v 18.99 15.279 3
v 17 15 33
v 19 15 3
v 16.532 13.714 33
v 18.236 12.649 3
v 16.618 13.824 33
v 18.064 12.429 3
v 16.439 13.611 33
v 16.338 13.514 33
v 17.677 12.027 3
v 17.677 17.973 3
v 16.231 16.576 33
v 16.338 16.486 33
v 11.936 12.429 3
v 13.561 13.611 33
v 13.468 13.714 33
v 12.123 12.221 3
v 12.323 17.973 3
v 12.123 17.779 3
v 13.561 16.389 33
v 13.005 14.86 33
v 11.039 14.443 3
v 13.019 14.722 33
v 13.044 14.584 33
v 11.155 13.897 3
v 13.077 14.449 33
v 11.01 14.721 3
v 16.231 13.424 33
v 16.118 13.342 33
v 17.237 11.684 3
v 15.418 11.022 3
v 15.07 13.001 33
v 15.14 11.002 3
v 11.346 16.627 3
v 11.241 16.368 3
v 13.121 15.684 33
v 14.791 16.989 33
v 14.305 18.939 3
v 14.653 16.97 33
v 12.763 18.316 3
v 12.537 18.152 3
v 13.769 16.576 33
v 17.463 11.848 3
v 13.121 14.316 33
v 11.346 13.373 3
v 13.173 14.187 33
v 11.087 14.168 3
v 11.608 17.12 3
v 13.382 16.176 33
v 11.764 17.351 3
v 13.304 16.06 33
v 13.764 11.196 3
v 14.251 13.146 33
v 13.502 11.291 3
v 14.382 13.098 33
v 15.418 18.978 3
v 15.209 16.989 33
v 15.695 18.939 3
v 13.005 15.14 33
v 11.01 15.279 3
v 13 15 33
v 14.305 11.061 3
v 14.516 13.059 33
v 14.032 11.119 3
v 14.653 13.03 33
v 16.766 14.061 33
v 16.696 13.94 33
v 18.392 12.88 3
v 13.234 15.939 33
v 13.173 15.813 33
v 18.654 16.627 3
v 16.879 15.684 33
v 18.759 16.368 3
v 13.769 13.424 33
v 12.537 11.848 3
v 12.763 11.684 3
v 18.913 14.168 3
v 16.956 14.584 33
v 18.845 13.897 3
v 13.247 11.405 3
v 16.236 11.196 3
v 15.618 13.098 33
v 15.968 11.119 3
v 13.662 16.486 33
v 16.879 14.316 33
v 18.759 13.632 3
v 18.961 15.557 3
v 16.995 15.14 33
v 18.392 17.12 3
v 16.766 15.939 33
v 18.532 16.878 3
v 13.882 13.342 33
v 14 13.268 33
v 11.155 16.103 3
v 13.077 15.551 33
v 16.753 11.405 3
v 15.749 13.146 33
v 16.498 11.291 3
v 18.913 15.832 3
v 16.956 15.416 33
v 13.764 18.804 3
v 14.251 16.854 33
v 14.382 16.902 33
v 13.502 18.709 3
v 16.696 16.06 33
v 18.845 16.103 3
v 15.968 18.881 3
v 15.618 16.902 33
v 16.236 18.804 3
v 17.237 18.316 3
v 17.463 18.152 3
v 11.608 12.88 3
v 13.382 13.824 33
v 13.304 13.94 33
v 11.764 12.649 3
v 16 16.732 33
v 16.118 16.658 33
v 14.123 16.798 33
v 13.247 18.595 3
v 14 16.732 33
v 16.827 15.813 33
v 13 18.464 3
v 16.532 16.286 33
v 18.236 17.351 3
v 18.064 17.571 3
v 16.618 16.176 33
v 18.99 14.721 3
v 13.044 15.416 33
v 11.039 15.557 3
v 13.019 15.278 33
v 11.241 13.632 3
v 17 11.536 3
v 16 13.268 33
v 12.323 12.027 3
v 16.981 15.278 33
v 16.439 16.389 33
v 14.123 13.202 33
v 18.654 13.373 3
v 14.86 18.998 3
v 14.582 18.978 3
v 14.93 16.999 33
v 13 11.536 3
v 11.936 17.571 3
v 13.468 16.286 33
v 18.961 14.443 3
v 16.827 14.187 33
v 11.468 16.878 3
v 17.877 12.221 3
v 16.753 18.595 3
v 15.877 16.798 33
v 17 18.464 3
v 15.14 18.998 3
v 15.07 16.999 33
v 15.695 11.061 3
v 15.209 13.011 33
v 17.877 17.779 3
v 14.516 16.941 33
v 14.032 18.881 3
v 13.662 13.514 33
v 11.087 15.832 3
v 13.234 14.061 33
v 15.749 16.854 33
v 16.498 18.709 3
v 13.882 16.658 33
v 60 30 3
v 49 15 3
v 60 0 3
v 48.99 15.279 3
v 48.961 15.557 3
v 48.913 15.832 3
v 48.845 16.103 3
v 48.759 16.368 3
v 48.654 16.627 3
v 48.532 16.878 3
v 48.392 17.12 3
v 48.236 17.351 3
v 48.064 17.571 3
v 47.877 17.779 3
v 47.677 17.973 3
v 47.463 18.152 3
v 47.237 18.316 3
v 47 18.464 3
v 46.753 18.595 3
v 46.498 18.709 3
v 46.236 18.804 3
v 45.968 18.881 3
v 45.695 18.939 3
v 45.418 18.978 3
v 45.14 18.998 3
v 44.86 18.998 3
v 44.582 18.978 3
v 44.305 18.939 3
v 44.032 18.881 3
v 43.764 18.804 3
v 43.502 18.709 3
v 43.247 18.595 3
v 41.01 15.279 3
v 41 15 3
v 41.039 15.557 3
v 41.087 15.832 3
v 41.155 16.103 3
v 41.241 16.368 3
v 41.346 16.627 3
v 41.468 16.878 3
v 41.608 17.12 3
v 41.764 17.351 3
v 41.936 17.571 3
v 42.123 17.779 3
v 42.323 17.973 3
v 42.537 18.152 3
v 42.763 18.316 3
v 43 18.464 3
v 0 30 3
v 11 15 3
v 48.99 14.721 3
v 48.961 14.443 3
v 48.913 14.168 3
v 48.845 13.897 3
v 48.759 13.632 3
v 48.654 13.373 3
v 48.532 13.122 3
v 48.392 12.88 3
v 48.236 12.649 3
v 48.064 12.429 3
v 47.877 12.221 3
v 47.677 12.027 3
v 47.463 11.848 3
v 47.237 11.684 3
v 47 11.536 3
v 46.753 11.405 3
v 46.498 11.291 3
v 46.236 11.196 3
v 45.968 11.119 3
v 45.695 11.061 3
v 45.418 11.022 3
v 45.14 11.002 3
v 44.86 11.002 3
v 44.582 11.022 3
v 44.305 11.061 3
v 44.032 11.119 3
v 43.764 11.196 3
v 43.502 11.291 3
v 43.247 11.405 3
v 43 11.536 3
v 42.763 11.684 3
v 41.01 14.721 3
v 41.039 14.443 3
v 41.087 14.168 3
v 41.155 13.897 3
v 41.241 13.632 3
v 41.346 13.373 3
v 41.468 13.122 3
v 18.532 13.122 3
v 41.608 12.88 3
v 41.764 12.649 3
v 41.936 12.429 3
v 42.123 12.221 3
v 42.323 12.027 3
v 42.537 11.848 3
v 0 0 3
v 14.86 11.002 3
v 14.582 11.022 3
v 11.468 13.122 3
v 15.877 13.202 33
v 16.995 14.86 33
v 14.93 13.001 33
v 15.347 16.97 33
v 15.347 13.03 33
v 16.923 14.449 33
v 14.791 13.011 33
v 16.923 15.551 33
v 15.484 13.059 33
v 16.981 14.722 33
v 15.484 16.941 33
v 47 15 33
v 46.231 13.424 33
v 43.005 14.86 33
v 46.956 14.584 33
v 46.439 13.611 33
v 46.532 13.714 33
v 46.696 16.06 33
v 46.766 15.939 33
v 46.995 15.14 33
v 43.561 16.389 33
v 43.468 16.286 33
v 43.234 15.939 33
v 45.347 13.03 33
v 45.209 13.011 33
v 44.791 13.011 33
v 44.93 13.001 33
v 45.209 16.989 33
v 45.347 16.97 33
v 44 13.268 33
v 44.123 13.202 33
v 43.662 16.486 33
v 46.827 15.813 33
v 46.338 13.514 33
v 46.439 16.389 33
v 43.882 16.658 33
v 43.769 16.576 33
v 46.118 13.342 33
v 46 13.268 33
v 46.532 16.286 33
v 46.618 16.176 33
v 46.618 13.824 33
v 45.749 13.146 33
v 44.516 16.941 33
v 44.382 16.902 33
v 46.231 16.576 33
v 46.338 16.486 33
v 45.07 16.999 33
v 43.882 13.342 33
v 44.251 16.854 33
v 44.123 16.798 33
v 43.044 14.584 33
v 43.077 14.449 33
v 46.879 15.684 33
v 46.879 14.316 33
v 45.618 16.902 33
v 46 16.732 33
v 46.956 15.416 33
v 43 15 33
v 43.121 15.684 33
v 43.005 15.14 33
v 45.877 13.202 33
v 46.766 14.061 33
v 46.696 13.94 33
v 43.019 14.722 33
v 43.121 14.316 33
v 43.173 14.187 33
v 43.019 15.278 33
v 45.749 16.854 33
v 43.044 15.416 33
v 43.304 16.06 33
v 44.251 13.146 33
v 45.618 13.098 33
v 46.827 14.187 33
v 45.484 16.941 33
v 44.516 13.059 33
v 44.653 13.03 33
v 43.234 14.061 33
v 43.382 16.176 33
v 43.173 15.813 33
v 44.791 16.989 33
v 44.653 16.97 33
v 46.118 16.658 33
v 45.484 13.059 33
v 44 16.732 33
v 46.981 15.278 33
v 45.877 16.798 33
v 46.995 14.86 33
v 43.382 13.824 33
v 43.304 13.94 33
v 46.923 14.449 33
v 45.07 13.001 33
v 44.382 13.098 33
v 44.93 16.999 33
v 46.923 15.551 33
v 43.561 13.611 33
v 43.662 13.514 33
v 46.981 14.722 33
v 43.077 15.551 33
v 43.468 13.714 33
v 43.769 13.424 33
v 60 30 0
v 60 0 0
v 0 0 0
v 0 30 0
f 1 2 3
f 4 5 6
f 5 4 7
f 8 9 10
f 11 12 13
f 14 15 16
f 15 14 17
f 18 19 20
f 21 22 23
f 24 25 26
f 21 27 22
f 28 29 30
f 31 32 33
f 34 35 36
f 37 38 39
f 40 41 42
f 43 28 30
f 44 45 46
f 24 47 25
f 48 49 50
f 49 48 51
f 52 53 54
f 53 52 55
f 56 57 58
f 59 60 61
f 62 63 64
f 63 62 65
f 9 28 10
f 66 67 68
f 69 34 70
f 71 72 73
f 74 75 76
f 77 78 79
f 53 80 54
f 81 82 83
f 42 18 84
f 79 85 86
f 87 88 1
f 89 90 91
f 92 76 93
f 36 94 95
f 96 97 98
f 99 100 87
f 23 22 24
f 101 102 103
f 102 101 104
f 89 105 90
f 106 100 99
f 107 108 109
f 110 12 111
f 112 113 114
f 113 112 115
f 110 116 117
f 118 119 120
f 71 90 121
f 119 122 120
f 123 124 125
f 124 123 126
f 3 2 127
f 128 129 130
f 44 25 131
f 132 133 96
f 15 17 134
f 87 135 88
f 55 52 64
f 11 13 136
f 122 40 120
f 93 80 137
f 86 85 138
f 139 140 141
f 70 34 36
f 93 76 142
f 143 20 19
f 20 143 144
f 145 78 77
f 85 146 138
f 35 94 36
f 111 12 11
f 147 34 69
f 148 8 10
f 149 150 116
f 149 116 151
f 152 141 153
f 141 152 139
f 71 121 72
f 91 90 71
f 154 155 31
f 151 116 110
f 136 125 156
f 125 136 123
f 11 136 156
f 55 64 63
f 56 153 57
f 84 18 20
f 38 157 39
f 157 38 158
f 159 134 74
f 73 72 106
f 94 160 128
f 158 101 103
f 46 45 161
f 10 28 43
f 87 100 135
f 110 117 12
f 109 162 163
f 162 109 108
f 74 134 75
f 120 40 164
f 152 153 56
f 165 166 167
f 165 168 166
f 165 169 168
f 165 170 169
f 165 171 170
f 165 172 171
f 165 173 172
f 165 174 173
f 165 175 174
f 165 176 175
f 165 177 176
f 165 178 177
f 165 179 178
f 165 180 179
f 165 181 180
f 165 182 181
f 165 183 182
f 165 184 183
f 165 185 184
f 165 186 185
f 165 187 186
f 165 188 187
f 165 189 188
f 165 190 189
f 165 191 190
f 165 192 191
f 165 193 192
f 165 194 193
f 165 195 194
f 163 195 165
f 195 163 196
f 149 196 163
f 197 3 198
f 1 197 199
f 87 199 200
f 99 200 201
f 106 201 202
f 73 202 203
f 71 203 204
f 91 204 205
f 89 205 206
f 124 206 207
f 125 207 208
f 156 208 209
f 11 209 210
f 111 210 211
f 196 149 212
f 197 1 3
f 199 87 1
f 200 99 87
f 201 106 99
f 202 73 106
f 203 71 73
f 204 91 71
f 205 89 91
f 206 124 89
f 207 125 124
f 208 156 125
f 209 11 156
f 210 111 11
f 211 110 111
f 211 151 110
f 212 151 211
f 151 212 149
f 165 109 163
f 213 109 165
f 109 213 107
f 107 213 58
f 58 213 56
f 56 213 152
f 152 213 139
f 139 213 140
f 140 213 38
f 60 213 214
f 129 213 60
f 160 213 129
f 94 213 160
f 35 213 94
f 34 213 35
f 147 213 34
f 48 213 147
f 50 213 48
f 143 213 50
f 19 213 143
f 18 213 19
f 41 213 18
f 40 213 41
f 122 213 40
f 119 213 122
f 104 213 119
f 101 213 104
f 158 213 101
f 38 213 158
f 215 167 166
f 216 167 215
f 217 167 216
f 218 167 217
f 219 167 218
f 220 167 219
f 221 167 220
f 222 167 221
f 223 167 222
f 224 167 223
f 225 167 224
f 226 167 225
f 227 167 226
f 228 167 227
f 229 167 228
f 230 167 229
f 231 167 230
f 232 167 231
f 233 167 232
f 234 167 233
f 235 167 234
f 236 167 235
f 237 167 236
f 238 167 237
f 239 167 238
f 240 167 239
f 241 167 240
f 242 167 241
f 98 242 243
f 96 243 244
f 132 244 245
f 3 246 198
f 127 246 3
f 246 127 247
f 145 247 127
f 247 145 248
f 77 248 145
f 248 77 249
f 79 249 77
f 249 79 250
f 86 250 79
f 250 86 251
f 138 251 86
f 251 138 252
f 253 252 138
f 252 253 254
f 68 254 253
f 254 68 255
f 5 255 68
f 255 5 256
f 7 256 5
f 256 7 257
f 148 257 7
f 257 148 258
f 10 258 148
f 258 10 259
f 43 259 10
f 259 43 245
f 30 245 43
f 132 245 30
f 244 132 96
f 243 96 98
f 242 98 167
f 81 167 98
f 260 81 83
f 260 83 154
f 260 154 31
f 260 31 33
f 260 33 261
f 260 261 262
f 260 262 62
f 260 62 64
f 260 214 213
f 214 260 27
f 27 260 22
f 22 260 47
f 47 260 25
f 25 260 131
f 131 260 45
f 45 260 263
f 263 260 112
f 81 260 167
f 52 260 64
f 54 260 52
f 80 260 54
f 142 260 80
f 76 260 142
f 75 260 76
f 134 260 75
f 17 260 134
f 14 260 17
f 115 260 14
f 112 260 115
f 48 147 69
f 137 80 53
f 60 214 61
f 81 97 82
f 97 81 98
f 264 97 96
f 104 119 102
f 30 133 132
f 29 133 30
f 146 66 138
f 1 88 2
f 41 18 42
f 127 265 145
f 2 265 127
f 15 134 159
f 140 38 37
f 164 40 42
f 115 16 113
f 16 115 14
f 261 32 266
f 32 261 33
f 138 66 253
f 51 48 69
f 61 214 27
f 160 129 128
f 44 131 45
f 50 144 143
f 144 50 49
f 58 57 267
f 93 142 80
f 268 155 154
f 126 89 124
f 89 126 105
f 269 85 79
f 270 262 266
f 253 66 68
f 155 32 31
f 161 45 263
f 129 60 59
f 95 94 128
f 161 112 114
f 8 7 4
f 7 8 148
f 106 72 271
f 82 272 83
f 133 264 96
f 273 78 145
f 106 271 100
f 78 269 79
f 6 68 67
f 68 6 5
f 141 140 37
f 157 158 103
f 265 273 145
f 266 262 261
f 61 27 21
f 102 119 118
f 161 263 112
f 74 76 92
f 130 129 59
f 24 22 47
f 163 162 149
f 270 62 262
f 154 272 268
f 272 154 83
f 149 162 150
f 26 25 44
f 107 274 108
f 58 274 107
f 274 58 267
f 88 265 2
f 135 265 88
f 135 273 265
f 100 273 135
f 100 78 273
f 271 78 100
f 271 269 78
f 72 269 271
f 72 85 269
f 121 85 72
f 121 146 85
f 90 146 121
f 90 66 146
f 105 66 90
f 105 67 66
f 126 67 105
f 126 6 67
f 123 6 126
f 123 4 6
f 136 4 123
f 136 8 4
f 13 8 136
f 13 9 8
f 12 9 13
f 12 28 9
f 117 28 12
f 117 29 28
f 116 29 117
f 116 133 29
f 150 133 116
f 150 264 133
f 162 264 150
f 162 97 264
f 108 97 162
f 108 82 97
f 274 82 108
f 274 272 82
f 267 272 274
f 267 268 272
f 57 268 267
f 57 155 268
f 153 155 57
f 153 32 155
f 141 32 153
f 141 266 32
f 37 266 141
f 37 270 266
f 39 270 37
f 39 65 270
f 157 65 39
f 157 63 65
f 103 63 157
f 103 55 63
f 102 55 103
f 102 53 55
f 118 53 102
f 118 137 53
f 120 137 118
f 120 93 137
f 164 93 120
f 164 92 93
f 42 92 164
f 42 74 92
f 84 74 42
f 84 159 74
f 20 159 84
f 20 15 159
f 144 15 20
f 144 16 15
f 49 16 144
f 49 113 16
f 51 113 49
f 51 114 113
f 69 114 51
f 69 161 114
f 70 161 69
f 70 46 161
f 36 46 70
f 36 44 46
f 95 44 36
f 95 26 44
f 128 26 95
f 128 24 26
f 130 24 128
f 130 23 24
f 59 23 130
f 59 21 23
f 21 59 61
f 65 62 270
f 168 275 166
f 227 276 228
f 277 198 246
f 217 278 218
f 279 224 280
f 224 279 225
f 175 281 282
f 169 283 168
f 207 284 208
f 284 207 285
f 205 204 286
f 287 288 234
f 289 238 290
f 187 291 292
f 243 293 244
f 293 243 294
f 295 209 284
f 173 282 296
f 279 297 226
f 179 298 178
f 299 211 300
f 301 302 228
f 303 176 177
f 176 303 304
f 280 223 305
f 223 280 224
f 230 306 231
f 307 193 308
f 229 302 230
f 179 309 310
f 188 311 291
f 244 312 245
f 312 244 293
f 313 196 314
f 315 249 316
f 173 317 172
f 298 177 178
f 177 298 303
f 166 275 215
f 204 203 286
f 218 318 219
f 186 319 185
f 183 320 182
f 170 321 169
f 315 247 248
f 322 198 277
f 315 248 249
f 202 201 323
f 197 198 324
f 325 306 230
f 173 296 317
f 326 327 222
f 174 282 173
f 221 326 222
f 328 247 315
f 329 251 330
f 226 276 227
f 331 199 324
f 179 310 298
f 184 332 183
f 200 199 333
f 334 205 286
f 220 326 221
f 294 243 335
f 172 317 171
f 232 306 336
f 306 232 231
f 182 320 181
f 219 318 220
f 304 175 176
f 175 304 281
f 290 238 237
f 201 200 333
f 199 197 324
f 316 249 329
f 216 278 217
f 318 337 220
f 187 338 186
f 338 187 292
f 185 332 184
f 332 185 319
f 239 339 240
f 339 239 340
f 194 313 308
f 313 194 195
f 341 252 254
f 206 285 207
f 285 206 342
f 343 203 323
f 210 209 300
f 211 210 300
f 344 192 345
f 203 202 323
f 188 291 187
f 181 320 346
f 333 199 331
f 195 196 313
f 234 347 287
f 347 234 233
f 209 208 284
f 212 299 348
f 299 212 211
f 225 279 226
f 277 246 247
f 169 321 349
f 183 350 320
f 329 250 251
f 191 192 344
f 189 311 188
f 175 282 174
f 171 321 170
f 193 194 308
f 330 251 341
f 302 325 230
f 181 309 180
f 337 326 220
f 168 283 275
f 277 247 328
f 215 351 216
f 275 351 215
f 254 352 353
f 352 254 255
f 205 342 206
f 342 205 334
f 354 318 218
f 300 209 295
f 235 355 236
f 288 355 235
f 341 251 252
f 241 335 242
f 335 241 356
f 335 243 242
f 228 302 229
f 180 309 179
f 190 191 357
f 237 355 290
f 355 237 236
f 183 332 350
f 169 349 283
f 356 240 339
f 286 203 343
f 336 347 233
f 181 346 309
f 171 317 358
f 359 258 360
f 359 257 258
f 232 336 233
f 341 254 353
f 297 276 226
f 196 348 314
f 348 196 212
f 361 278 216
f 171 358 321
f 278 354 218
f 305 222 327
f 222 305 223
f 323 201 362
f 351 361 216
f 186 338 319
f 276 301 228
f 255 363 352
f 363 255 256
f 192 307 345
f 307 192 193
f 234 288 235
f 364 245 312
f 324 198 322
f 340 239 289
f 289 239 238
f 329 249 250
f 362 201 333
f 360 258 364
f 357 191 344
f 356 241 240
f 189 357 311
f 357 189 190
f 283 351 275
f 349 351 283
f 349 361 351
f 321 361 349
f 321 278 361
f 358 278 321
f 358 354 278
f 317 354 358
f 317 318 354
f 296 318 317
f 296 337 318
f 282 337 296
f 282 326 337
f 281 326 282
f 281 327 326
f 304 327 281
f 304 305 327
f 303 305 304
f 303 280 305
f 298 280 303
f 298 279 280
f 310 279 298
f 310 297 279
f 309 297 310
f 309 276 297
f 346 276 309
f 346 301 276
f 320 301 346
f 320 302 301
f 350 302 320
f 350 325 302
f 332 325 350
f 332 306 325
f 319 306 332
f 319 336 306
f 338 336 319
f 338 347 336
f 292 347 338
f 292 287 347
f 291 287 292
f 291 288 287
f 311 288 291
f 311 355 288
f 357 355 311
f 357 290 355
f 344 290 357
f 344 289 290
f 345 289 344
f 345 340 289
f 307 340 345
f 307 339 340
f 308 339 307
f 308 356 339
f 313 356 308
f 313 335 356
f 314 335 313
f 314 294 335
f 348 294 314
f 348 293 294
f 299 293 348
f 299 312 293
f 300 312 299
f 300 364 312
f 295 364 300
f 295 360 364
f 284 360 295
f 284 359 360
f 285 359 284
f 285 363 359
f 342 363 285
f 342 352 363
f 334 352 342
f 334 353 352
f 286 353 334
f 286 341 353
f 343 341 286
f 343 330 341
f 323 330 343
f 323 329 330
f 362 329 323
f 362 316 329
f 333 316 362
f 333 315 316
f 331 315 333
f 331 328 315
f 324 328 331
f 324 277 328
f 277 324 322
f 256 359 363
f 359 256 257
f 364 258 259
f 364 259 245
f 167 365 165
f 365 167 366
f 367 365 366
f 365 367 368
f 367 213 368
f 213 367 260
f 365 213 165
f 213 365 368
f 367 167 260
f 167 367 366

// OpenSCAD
$fn = 90;
t = 3; // thickness
h = 30; // mount height
d = 8; // bottom diameter

cube([60, 30, t]);

translate([15, 30 / 2, t]) {
    cylinder(d1 = d, d2 = d / 2, h = h);
    translate([30, 0, 0]) cylinder(d1 = d, d2 = d / 2, h = h);
}
